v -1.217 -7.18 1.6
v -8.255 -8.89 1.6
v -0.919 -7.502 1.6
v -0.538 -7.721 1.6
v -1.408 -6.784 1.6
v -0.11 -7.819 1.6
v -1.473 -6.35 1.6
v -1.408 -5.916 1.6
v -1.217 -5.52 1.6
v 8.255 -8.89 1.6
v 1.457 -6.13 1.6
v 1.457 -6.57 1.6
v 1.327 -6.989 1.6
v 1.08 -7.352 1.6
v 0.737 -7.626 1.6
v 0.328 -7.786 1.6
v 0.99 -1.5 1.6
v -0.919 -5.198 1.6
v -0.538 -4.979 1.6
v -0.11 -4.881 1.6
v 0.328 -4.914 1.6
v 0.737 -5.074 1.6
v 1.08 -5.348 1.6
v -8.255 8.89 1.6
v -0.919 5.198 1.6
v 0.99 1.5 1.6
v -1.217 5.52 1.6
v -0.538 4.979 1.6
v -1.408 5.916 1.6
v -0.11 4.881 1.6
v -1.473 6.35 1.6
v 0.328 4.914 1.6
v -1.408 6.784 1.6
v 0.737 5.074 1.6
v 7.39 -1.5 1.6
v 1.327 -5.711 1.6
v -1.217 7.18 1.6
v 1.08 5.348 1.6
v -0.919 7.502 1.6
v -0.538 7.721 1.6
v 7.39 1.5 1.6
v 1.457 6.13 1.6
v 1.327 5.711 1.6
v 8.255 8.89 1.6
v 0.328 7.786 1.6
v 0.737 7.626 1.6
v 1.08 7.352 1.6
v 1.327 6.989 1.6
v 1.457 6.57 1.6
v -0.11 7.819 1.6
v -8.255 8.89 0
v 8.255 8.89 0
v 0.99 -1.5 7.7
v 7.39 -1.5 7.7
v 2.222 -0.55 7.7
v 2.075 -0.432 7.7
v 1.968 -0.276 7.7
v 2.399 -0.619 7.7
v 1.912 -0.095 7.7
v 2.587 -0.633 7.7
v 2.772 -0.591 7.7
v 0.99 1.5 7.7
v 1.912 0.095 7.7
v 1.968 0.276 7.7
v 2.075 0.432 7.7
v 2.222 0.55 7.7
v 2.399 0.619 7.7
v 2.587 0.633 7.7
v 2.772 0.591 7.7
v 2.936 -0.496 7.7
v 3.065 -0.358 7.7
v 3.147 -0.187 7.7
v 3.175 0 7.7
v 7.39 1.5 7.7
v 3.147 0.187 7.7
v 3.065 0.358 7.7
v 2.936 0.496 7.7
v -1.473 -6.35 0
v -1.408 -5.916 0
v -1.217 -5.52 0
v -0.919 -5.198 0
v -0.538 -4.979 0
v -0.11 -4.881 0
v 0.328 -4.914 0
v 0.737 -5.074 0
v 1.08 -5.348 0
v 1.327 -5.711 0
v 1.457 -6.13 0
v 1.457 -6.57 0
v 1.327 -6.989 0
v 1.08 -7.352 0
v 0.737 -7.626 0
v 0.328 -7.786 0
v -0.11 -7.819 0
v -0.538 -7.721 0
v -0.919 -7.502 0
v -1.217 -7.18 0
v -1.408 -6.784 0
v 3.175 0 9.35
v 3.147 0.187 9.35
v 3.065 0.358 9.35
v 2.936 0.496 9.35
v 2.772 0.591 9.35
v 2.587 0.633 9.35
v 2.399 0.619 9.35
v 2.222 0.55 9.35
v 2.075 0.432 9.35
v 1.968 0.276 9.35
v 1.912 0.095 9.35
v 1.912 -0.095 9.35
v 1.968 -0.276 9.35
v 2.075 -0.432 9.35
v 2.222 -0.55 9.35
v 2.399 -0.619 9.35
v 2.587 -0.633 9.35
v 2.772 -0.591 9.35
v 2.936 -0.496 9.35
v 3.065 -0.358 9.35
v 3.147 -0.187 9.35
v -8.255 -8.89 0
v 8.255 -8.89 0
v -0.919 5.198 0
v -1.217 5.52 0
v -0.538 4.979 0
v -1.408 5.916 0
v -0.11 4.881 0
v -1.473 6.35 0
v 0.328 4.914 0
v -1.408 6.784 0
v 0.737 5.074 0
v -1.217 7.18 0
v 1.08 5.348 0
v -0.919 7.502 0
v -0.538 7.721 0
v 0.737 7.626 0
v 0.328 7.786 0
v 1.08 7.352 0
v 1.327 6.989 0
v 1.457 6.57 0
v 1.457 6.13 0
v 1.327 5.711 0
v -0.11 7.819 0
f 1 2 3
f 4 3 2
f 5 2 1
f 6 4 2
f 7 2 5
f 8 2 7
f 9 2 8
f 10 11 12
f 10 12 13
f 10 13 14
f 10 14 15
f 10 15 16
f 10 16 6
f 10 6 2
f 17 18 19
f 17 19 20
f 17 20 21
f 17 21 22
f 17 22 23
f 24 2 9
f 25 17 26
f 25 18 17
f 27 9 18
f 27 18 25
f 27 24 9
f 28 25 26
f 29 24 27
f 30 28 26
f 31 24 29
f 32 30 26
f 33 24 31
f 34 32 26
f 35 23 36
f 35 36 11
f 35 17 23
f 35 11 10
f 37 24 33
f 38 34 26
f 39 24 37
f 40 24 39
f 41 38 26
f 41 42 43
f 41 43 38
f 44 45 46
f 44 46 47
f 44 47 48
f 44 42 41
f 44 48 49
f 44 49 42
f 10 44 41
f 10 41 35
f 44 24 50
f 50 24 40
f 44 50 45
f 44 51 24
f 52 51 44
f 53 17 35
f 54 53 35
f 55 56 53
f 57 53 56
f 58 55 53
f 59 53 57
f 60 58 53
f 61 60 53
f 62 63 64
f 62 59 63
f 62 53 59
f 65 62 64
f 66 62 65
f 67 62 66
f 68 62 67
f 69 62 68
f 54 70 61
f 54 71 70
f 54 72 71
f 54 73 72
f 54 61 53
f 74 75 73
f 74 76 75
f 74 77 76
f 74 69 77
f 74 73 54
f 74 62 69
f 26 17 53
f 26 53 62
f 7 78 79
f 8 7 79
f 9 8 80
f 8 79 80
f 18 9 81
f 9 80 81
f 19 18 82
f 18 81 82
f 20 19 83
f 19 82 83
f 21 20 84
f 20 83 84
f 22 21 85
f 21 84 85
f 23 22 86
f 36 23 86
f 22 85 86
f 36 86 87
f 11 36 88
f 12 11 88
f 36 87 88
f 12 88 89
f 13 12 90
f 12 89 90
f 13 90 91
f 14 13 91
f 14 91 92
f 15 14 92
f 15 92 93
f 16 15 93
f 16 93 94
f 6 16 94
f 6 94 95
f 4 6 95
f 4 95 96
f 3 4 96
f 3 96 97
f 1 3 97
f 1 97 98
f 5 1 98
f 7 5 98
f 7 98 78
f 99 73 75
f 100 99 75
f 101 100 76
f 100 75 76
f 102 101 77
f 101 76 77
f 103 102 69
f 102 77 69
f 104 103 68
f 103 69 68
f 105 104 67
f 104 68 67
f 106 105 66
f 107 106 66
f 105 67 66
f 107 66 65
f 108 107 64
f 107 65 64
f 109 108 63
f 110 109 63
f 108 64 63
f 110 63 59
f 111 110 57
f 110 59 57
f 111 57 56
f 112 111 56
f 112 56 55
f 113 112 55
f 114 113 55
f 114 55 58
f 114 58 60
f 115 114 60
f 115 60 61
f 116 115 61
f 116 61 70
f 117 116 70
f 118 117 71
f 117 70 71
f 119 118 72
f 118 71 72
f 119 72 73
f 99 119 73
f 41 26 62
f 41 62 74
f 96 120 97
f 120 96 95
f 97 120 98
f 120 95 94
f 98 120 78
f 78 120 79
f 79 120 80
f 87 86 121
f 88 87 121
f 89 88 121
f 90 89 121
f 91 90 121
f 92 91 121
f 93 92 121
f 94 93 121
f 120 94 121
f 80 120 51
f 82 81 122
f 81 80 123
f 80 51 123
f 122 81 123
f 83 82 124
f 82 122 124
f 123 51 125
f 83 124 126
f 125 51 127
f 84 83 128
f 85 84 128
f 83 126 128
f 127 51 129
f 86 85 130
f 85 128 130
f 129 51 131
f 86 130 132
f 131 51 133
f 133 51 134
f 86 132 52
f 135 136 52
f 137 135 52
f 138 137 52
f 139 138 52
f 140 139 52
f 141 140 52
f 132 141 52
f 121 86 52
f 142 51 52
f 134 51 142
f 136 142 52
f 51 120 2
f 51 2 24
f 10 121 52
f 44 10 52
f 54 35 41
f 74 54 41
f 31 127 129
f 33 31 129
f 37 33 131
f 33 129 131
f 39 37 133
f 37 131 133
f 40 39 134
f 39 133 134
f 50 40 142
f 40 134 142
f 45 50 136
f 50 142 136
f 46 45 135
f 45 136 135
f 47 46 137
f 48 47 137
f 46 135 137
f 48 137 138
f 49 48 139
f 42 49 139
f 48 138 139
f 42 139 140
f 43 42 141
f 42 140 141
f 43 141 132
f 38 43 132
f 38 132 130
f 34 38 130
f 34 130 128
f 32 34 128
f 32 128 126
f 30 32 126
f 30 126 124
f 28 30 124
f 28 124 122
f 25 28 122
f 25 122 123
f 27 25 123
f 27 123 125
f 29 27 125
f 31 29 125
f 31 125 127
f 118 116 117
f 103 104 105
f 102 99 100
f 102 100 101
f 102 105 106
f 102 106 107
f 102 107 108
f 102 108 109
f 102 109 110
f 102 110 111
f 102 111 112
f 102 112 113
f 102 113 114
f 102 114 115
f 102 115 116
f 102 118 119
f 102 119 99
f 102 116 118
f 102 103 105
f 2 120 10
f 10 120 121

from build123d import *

# Parameters (mm, degrees)
SKETCH1_W                 = 16.51
SKETCH1_H                 = 17.78
BOSS_EXTRUDE1_DEPTH       = 1.6
F_4_CLEARANCE_HOLE1_D     = 2.9464
F_4_CLEARANCE_HOLE1_DEPTH = 6.35
F_4_CLEARANCE_HOLE1_TIP   = 0.885187864
SKETCH4_W                 = 6.4
SKETCH4_H                 = 3
BOSS_EXTRUDE2_DEPTH       = 6.1
SKETCH5_R                 = 0.635
BOSS_EXTRUDE3_DEPTH       = 1.65


with BuildPart() as part:
    # Sketch1 → Boss-Extrude1 (new body)
    with BuildSketch(Plane.XY):
        Rectangle(SKETCH1_W, SKETCH1_H)
    extrude(amount=BOSS_EXTRUDE1_DEPTH)

    # #4 Clearance Hole1
    with Locations(Plane(origin=(0, 6.35, 1.6), x_dir=(1, 0, 0), z_dir=(0, 0, 1))):
        with Locations((0, 0), (0, -12.7)):
            Hole(F_4_CLEARANCE_HOLE1_D / 2, depth=F_4_CLEARANCE_HOLE1_DEPTH)
            with Locations((0, 0, -(F_4_CLEARANCE_HOLE1_DEPTH + F_4_CLEARANCE_HOLE1_TIP / 2))):  # 118° drill point
                Cone(0, F_4_CLEARANCE_HOLE1_D / 2, F_4_CLEARANCE_HOLE1_TIP, mode=Mode.SUBTRACT)

    # Sketch4 → Boss-Extrude2 (add)
    with BuildSketch(Plane.XY.offset(1.6)):
        with Locations((4.19, 0)):
            Rectangle(SKETCH4_W, SKETCH4_H)
    extrude(amount=BOSS_EXTRUDE2_DEPTH)

    # Sketch5 → Boss-Extrude3 (add)
    with BuildSketch(Plane.XY.offset(7.7)):
        with Locations((2.54, 0)):
            Circle(SKETCH5_R)
    extrude(amount=BOSS_EXTRUDE3_DEPTH)


solid = part.part
